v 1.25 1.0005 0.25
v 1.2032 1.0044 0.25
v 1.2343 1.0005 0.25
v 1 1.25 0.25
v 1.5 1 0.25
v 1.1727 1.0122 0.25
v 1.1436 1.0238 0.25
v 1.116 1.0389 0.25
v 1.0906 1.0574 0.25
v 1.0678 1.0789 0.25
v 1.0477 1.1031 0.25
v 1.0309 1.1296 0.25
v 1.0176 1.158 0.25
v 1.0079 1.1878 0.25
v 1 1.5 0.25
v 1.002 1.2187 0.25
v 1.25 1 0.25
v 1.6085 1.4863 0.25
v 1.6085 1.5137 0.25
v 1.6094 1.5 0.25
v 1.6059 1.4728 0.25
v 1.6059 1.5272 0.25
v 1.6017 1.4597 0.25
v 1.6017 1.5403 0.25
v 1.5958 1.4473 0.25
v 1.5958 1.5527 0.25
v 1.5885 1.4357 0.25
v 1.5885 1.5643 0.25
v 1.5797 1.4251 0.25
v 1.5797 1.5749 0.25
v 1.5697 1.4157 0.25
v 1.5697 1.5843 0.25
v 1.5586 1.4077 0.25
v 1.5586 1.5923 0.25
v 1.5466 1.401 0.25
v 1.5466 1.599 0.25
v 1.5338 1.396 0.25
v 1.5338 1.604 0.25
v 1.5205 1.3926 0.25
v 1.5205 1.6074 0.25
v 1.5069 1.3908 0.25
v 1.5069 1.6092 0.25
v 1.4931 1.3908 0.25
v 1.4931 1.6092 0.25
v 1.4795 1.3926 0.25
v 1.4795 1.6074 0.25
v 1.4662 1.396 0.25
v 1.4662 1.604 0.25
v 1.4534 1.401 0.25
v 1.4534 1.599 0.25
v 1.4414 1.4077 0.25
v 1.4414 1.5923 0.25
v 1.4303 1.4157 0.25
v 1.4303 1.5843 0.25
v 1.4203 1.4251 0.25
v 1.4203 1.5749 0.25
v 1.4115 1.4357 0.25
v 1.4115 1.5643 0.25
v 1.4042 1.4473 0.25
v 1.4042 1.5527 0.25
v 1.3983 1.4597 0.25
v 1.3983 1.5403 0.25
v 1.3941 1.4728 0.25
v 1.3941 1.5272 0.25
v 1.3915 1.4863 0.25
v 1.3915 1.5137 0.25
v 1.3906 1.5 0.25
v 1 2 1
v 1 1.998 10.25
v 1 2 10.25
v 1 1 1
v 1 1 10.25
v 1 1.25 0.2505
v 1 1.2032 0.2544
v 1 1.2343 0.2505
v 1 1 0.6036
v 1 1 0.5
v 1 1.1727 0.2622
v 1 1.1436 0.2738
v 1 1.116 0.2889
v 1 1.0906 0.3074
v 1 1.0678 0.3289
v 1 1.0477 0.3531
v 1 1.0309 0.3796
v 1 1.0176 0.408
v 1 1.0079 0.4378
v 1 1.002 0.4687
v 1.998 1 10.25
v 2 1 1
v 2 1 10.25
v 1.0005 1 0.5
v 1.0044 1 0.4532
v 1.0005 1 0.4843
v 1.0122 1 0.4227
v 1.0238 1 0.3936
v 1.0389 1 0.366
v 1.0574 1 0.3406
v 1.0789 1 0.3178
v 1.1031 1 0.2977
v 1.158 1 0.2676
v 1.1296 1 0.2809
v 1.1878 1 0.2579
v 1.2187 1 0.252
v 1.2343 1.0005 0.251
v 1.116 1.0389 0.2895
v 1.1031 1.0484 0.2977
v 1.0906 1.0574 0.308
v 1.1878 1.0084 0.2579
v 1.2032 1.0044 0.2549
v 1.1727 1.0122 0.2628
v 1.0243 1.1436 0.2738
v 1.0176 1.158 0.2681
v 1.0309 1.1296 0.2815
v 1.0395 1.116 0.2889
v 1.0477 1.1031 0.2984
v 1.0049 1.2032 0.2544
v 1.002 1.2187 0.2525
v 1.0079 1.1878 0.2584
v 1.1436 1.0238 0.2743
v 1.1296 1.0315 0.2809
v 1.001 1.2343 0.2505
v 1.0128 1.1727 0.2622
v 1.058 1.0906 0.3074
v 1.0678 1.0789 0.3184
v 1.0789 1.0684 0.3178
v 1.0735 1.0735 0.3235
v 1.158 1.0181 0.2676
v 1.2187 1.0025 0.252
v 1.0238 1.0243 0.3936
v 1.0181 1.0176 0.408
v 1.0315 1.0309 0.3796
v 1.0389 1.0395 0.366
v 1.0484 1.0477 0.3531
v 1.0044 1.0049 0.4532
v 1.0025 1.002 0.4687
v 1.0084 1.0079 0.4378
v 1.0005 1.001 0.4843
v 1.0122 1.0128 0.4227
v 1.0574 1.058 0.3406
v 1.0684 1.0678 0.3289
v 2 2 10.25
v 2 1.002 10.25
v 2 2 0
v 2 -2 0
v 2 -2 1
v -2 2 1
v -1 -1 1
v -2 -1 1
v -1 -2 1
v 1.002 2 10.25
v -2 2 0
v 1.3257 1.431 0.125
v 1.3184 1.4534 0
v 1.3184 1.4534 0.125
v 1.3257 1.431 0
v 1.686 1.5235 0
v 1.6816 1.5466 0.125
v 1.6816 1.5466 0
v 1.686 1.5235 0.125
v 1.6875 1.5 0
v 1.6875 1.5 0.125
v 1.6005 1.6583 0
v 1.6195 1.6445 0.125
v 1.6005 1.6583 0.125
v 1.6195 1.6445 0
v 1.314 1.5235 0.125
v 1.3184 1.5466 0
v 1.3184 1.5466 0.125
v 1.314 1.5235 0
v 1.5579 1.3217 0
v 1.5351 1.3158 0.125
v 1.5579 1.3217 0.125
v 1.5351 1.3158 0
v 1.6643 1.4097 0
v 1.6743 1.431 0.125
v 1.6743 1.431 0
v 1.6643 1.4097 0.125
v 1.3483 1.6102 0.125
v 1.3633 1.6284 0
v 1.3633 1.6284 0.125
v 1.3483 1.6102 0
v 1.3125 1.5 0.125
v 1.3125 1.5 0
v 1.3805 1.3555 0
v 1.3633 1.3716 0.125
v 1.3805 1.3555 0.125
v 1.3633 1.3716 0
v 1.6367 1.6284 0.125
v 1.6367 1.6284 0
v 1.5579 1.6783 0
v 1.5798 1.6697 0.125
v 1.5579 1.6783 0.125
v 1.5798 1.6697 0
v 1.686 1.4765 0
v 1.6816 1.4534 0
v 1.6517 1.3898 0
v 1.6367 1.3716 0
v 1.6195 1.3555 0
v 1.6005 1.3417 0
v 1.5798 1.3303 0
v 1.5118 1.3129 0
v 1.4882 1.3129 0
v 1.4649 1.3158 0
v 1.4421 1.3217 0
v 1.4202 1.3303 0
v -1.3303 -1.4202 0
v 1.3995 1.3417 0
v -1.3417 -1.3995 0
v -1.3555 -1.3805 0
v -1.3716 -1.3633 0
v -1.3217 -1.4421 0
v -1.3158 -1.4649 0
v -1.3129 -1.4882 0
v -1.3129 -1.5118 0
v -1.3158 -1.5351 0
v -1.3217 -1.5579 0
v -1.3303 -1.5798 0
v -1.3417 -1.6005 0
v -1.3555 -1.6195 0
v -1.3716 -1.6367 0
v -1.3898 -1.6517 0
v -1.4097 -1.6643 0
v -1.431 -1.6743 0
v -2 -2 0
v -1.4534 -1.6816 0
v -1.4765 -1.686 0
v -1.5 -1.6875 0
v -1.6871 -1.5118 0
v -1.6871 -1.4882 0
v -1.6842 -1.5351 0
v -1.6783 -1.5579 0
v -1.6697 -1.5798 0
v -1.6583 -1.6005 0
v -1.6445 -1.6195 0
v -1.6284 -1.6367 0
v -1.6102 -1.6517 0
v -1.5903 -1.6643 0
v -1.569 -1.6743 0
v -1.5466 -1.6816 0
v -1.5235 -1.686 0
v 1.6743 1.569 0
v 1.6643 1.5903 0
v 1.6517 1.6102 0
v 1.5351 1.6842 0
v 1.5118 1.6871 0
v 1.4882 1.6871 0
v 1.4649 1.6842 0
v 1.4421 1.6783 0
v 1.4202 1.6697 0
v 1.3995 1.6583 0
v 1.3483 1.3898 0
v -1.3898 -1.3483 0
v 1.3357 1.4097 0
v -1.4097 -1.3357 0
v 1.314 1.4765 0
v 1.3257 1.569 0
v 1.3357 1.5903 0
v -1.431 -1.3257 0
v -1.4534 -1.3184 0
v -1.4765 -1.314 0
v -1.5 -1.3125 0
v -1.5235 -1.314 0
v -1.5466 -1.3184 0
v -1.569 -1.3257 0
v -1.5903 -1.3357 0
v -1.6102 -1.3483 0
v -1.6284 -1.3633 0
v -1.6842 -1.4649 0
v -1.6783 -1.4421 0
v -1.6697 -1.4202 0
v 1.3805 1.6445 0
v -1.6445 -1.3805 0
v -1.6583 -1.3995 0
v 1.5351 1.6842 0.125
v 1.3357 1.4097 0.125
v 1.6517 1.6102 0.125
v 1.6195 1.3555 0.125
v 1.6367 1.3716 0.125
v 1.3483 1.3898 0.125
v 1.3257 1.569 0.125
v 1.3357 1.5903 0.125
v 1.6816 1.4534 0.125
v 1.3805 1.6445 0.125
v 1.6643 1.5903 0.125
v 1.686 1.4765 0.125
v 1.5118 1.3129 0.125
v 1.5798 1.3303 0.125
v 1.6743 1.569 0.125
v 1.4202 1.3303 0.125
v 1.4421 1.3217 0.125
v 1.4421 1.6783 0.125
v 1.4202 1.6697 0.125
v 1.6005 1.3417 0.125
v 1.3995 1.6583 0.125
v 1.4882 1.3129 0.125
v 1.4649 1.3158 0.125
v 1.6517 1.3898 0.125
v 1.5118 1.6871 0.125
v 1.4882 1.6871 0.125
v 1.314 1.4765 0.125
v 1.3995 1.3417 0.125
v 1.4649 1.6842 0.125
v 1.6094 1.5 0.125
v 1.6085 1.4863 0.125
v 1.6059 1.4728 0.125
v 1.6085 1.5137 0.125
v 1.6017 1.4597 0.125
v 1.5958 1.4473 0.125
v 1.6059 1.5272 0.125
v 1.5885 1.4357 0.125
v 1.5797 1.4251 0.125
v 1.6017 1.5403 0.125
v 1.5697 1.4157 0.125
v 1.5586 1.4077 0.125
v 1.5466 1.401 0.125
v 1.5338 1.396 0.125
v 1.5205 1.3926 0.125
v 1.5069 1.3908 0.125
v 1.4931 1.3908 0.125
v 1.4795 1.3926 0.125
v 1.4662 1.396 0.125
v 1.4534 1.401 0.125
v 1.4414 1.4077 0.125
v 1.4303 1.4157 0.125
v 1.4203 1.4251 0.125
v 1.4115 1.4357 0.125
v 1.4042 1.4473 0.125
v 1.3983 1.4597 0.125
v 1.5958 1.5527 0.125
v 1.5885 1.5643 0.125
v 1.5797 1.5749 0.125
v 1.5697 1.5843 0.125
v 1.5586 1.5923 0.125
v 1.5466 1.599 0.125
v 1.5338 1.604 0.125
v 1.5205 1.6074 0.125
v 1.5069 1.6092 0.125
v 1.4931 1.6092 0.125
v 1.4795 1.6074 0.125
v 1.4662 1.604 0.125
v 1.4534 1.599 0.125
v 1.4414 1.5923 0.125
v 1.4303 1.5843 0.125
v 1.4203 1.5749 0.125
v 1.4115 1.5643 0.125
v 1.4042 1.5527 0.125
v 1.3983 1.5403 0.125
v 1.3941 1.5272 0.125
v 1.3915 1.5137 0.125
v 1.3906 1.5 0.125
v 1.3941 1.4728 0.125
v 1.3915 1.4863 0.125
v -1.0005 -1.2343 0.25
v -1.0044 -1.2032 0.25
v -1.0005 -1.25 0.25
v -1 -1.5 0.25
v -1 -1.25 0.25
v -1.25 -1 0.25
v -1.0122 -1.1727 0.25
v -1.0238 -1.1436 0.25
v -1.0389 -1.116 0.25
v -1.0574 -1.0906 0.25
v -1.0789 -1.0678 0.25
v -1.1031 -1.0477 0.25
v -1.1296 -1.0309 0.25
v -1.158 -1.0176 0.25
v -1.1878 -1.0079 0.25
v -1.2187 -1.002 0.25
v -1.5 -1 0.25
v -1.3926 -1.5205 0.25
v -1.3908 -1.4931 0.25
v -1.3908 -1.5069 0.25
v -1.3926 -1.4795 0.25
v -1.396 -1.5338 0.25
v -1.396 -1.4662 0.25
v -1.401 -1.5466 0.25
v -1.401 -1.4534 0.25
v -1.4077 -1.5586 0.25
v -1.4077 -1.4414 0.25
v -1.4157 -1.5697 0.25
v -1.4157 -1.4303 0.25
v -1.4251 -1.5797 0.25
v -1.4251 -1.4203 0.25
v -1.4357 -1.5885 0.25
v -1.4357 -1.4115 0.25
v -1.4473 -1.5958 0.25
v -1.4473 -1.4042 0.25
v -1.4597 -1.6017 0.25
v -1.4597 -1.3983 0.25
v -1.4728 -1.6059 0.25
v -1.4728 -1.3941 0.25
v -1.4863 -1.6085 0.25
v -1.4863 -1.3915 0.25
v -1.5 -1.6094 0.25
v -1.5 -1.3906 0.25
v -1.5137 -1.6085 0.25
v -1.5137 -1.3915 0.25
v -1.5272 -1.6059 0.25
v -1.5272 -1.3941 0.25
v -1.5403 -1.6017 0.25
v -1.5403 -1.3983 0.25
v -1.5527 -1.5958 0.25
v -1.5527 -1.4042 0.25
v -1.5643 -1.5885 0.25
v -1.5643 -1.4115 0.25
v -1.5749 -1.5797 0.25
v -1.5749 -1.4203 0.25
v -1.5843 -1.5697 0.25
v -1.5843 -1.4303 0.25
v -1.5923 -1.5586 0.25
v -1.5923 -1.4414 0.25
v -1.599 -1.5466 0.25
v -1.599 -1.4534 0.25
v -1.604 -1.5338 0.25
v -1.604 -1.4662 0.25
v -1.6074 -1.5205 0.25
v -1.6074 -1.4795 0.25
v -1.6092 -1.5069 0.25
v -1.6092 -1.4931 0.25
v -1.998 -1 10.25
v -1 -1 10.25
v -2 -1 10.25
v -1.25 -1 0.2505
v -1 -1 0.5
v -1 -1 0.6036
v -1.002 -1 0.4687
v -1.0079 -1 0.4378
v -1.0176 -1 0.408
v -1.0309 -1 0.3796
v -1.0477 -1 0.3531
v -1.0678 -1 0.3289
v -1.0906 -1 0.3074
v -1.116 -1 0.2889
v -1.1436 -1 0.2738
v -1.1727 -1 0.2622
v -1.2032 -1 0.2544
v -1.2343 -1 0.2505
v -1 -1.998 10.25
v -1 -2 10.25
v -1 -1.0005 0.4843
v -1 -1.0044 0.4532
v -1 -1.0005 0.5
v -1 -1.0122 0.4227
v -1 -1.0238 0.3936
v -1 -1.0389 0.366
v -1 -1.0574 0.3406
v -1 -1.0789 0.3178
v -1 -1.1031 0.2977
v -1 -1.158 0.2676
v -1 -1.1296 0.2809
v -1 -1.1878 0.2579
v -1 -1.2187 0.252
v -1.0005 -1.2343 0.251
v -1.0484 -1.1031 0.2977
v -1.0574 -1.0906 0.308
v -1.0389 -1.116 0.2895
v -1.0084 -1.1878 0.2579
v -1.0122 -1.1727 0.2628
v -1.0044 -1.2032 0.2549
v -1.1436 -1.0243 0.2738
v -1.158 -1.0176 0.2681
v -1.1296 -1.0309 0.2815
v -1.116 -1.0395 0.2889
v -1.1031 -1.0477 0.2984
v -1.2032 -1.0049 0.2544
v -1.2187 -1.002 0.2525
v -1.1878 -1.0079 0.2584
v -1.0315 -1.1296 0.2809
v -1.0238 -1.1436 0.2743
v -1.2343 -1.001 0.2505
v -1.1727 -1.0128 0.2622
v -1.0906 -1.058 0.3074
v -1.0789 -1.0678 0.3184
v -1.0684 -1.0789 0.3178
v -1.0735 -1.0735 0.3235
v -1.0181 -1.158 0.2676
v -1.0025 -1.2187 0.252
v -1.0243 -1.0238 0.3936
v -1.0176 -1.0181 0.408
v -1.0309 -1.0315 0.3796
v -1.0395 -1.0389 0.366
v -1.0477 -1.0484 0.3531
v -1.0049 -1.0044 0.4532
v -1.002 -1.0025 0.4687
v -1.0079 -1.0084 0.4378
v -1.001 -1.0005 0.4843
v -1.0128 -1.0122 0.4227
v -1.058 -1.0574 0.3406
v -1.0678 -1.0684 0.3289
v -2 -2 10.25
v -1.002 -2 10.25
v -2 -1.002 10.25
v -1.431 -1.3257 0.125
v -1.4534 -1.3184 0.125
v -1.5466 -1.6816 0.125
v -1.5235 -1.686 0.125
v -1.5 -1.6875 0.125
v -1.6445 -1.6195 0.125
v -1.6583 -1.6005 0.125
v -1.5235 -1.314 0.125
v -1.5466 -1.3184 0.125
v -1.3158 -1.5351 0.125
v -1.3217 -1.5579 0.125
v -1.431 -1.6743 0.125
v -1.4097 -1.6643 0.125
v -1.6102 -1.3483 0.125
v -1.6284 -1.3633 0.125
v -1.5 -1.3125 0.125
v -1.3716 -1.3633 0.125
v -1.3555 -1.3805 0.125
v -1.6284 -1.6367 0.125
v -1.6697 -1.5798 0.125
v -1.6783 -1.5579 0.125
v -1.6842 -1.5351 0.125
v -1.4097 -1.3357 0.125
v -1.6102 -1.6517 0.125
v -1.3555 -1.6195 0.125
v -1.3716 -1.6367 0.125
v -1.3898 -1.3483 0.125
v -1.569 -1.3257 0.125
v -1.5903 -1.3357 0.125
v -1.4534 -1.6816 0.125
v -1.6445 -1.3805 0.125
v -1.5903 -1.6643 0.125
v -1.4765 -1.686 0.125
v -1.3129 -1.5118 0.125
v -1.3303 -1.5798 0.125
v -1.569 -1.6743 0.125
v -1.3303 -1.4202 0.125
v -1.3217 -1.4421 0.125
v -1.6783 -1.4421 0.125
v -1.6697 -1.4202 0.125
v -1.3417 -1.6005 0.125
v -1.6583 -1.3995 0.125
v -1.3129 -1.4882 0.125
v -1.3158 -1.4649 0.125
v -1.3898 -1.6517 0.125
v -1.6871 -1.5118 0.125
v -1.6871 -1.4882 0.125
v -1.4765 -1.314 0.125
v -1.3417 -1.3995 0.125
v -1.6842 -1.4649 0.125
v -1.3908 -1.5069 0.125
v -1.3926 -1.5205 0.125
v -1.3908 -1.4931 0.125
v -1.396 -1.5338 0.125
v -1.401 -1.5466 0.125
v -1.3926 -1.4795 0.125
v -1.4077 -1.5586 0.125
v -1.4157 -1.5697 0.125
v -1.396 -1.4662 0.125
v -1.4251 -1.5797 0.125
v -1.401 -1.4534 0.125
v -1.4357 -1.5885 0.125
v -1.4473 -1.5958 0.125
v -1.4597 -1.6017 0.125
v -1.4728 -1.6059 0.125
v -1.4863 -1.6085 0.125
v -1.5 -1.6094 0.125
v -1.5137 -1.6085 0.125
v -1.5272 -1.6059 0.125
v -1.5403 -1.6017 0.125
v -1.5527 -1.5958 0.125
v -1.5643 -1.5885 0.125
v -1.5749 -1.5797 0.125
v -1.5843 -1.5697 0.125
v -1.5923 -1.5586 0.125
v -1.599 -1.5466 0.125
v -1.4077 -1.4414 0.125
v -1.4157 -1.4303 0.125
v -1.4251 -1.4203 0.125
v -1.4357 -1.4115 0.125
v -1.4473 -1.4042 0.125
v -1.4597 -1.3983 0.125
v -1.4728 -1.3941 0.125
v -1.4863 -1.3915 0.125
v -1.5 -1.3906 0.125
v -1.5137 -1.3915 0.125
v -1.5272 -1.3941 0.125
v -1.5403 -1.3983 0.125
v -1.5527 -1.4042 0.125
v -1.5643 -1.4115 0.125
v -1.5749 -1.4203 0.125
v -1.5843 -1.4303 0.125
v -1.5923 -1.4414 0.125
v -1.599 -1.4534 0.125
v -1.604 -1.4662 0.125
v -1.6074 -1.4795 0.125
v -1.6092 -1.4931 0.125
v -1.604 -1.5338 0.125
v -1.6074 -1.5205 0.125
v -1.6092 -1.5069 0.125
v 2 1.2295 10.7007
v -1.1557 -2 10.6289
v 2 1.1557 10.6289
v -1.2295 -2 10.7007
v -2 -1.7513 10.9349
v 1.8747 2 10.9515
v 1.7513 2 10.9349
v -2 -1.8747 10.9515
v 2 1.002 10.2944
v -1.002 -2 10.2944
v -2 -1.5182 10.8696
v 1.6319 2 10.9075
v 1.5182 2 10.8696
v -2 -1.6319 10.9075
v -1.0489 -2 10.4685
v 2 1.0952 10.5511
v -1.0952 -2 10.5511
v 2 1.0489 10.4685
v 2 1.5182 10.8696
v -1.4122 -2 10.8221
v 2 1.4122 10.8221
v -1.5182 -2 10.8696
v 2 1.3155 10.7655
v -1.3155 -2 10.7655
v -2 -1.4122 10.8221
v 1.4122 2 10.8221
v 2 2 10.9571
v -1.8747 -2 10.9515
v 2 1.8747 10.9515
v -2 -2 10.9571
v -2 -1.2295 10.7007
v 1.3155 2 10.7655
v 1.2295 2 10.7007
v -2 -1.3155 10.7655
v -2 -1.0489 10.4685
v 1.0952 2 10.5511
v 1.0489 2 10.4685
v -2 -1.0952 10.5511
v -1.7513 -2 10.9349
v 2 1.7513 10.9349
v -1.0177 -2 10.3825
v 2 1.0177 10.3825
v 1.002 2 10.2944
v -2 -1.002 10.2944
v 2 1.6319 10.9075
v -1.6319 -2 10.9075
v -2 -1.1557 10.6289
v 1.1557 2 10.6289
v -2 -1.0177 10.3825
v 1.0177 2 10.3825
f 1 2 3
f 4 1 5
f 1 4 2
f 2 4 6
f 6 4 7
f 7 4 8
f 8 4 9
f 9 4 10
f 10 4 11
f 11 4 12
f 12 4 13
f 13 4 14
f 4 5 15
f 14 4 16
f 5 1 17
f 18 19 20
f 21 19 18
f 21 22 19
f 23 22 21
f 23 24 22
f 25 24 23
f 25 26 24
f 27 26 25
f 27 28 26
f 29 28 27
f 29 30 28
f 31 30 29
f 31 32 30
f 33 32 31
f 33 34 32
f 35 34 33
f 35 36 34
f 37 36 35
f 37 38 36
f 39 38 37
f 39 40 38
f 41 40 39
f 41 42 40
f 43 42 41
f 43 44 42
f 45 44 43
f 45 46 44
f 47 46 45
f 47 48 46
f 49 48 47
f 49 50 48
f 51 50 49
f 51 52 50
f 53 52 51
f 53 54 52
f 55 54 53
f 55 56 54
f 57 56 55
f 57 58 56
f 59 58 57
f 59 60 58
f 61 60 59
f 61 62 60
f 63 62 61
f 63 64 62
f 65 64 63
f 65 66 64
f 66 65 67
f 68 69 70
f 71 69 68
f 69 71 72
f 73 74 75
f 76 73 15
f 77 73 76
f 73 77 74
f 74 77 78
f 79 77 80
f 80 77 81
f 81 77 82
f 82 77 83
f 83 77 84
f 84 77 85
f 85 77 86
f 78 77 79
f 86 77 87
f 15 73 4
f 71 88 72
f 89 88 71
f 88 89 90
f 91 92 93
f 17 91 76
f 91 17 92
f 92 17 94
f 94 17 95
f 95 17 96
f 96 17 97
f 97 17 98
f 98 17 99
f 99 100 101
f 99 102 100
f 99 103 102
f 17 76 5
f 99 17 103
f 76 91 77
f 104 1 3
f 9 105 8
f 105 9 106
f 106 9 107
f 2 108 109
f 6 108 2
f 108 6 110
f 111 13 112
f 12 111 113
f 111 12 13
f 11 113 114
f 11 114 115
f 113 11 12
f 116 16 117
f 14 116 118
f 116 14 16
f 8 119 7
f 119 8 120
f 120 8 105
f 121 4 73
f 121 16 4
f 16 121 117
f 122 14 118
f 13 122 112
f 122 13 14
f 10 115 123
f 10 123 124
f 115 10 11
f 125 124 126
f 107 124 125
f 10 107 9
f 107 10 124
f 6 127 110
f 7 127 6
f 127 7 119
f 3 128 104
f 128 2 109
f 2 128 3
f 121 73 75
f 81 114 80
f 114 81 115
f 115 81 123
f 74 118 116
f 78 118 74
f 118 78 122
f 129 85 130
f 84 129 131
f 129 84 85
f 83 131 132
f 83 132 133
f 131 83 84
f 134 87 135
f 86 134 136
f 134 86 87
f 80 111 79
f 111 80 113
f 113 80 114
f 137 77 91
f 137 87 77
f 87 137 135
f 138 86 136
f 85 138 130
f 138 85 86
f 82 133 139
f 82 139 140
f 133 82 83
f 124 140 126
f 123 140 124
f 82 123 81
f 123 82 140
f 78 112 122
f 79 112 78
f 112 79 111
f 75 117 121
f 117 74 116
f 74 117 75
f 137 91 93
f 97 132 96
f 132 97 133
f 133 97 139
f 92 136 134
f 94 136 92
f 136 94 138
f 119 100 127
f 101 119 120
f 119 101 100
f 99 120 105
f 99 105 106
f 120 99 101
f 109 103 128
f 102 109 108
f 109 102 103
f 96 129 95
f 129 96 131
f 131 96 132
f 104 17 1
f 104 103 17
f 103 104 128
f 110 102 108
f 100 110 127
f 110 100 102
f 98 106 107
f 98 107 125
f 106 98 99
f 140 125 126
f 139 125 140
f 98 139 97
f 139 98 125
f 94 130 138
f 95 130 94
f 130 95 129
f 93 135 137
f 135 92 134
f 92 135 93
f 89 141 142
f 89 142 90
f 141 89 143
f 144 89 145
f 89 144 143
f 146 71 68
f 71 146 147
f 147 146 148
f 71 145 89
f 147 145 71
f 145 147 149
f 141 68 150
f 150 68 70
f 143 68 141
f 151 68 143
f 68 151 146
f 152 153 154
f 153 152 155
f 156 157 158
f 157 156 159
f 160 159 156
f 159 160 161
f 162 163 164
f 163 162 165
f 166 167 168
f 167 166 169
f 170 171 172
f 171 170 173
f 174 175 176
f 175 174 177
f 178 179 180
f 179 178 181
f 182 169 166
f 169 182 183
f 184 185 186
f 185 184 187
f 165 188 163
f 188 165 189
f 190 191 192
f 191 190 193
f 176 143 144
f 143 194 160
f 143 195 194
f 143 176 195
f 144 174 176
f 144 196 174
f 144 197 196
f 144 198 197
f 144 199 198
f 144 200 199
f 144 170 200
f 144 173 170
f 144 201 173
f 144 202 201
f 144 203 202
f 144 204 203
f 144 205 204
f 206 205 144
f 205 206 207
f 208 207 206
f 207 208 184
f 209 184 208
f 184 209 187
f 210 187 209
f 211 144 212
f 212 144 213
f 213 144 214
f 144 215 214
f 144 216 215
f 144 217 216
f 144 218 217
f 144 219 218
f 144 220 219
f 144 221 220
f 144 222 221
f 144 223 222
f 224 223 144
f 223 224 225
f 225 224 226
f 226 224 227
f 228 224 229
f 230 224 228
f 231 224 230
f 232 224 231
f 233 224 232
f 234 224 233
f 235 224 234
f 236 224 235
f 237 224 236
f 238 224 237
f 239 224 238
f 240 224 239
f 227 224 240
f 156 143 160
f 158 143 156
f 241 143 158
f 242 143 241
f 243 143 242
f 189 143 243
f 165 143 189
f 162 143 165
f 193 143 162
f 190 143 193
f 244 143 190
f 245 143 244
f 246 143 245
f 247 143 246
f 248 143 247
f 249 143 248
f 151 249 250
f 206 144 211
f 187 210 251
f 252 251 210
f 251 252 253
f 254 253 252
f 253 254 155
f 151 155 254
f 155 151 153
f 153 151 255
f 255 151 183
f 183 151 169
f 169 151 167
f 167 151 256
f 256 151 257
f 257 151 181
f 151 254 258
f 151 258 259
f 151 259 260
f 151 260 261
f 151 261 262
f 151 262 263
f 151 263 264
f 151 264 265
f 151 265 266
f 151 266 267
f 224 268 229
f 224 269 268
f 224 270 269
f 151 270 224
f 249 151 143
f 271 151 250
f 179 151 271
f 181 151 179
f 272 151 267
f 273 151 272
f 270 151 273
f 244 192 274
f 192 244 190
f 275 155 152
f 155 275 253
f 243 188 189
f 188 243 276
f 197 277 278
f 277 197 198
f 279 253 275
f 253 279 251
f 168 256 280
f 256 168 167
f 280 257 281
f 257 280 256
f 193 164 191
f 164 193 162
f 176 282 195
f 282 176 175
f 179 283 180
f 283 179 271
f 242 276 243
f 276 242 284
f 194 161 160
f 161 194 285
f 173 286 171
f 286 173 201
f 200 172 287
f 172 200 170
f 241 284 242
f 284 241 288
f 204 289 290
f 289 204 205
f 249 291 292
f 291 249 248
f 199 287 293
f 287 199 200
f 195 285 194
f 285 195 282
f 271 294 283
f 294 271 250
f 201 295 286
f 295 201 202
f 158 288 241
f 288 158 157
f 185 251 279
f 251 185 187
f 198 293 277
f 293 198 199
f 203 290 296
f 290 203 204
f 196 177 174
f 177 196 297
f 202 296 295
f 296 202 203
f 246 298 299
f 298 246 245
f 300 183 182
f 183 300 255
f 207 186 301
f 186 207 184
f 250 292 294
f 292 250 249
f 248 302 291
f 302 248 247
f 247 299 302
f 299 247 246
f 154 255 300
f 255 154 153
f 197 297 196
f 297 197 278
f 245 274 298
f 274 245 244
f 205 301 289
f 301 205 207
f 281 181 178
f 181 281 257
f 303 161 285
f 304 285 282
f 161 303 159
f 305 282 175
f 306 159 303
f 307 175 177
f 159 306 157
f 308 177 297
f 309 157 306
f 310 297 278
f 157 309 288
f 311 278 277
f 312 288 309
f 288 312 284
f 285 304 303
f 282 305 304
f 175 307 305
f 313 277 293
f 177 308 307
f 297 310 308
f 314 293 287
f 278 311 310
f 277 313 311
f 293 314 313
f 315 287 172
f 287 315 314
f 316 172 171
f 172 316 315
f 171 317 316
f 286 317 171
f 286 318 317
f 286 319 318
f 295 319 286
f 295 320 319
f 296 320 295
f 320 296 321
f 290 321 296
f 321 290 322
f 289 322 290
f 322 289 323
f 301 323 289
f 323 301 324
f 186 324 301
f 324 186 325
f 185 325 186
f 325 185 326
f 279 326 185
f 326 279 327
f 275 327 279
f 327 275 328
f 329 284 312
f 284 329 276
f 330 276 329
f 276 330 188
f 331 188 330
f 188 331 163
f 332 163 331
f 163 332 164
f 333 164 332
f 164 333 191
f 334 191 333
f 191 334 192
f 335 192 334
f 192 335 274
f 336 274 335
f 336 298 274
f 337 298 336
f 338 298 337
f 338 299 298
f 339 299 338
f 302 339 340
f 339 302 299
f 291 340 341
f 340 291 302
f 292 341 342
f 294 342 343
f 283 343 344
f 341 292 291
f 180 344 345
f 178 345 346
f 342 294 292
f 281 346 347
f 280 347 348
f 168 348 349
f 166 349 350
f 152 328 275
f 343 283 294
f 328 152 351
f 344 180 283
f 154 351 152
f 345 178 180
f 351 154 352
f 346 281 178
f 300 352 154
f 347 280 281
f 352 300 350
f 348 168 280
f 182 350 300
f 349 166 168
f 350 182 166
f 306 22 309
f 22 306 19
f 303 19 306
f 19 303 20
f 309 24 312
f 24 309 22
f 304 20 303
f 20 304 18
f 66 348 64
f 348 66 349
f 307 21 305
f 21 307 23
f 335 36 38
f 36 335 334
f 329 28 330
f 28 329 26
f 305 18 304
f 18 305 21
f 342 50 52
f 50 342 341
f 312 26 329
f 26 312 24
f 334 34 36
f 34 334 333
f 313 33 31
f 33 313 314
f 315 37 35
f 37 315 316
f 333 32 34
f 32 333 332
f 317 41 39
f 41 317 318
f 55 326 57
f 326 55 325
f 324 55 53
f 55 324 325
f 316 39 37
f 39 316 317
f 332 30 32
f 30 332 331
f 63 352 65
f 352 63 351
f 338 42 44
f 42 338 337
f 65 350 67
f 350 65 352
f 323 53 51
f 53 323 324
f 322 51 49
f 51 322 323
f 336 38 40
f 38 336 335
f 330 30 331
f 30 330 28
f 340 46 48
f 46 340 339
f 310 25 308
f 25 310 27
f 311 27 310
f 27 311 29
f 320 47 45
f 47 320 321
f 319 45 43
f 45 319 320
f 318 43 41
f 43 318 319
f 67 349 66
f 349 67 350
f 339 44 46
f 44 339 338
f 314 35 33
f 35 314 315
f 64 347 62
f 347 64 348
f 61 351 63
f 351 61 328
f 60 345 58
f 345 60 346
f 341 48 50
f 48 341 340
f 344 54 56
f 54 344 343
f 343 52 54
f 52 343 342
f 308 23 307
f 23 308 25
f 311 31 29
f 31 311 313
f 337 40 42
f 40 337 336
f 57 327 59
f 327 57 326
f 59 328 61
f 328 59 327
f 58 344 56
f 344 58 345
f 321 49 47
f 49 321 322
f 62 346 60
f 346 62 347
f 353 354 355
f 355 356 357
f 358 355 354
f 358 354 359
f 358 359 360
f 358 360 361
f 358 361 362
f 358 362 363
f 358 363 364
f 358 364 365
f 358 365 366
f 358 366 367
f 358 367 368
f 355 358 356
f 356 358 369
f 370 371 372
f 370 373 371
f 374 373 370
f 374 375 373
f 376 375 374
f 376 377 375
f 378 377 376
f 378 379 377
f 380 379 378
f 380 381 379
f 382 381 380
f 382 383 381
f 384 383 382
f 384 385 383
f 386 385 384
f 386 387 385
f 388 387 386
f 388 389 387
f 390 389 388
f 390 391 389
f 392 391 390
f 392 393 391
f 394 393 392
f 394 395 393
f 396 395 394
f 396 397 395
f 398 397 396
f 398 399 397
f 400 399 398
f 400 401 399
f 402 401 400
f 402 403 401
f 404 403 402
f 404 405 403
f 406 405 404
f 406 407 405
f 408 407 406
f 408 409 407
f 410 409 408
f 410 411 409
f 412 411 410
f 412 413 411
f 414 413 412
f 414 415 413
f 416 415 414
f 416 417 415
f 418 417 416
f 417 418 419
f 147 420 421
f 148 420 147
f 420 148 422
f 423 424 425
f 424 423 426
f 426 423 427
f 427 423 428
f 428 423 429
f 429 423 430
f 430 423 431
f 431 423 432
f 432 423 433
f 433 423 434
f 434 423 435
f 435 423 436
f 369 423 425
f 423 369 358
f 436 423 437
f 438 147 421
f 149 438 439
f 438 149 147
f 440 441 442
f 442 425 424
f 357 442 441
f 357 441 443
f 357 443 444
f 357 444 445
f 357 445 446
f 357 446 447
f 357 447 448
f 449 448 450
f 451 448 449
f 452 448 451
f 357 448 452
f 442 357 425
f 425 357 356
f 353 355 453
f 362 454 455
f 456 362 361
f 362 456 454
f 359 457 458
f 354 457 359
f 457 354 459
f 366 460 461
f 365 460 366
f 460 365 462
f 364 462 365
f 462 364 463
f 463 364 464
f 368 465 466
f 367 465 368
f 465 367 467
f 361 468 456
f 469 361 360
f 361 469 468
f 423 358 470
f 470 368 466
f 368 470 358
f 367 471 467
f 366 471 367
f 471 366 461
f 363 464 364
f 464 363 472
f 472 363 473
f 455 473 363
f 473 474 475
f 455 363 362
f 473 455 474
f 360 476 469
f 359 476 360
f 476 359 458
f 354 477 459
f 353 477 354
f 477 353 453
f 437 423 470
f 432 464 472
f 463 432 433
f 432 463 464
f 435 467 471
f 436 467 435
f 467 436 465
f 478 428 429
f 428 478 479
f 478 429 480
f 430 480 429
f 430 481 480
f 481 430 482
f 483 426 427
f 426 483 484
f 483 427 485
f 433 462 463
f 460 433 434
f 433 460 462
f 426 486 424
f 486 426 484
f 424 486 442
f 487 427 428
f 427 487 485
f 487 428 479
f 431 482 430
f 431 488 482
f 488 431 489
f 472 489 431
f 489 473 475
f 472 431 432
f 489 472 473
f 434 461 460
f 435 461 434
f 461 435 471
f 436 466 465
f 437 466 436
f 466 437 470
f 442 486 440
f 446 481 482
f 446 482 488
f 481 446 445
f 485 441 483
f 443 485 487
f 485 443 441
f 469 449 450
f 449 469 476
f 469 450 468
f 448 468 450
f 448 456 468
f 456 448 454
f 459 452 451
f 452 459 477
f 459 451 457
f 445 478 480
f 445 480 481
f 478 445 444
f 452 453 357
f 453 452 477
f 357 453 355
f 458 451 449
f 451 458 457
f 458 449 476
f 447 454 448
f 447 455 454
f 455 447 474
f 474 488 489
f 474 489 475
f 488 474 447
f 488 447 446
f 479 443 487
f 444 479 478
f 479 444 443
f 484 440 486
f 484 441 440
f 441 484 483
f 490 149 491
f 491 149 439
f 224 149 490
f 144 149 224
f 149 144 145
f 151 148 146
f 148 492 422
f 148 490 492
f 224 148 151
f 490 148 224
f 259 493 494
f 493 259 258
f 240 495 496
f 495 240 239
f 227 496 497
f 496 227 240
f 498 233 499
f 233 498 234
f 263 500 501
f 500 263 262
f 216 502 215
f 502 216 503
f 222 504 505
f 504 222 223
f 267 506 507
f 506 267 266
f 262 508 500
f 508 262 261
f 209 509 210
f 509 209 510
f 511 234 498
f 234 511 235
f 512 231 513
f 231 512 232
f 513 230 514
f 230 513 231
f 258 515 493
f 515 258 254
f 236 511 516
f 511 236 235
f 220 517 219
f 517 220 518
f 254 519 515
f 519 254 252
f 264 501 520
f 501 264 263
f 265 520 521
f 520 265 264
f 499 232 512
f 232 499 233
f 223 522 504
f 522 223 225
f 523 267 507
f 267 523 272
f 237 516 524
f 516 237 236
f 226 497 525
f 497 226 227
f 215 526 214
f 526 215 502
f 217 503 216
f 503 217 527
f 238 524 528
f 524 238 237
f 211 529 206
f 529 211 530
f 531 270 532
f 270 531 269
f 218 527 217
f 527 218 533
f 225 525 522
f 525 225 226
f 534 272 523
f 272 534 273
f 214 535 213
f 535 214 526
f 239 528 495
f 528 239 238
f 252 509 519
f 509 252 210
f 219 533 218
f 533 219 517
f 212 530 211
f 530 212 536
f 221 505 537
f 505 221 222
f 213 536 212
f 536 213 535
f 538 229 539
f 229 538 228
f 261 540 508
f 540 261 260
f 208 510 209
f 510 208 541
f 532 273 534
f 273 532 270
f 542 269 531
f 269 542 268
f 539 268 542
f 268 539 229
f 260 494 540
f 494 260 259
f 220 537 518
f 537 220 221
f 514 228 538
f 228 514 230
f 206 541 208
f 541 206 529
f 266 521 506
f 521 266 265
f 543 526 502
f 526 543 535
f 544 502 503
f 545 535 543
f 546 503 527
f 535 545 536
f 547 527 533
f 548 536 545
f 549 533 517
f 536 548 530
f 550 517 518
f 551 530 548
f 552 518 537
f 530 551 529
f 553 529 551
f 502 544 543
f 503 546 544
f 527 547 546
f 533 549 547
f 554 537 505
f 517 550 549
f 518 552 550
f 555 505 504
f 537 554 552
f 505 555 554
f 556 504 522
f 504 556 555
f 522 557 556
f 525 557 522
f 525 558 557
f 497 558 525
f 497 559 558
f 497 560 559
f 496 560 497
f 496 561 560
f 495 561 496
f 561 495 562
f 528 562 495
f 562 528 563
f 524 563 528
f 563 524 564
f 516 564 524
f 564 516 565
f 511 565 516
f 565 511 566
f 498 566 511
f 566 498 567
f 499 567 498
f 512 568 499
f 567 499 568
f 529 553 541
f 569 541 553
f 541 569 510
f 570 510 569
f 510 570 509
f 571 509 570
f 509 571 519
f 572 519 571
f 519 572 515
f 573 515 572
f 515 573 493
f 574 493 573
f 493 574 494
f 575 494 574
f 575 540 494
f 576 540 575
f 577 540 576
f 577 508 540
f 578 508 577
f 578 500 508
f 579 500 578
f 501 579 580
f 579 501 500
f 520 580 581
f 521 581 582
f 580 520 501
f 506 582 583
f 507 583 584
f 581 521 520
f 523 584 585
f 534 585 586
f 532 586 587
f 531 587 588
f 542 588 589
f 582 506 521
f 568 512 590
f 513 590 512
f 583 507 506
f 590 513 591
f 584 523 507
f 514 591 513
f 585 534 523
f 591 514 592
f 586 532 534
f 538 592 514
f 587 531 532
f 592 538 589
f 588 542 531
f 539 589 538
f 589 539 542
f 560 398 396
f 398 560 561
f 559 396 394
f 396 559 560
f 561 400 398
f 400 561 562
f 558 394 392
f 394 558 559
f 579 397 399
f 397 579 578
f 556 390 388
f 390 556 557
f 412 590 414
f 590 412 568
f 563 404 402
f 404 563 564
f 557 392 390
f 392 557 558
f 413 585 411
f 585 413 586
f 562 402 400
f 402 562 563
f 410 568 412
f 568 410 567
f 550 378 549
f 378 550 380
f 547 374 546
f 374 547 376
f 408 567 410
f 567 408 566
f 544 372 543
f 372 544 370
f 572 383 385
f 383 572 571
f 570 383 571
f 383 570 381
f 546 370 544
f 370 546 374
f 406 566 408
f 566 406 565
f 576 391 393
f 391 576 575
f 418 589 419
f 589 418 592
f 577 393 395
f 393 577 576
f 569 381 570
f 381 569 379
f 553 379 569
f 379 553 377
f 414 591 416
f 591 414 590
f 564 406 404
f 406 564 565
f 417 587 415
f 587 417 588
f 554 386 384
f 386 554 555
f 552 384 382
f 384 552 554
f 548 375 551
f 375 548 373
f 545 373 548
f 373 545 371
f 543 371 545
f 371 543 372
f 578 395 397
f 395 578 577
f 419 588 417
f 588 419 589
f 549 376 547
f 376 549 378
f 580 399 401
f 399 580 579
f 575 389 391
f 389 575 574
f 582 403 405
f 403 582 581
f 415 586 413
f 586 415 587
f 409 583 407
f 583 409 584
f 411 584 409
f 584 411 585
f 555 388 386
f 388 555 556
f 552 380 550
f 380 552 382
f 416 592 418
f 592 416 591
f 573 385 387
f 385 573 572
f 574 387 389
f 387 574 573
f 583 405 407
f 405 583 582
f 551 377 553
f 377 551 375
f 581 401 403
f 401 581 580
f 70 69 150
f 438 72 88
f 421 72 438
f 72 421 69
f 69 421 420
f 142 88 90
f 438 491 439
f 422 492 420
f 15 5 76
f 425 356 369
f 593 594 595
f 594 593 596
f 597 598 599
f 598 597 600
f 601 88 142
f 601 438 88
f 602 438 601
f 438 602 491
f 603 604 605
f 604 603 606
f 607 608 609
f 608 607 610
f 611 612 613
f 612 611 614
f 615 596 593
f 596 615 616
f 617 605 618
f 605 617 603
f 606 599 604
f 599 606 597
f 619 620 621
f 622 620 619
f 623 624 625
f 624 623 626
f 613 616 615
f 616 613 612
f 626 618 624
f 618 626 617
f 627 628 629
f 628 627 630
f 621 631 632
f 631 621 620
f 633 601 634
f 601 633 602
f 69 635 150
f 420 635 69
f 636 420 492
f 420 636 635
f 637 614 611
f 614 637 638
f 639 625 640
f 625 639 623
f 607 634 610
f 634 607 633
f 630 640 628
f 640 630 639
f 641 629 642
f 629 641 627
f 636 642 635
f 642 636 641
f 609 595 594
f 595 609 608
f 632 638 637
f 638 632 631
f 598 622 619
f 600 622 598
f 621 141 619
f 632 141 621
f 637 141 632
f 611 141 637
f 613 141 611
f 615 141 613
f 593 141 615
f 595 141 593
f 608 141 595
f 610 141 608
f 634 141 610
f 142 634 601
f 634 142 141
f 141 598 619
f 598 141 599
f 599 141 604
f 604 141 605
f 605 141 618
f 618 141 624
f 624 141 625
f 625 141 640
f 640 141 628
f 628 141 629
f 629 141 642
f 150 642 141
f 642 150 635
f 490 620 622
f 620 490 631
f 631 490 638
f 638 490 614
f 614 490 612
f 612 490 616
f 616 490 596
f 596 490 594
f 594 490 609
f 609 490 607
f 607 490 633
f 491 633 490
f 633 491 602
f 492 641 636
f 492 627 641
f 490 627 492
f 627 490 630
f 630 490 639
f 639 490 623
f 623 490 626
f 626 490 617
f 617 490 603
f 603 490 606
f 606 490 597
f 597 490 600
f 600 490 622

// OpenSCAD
$fn = 50;
stand();

module stand() {
    width = 4;
    length = 4;
    height = 1;

    post_width = 1;
    post_scale = 5/16;

    difference() {
        base_block(width, length, height);
        post_holes(width, length, height, post_width, post_scale);
    }

    // We need to get the lift (1/4) out of post_holes properly.
    frame(width, length, 1/4, post_width, post_scale);
}

module base_block(width, length, height) {
    translate([0, 0, height/2]) {
        cube([width, length, height], center=true);
    }
}

module post_holes(width, length, height, post_width) {
    module milled_hole(height, screw_stack) {
        milled_height = height - screw_stack;

        module tool_extreme(tool_diameter) {
            tool_radius = tool_diameter/2;

            difference() {
                cube([tool_radius, tool_radius, milled_height]);
                translate([tool_radius, tool_radius, 0]) {
                    cylinder(r = tool_radius, h = milled_height);
                }
            }
        }

        module x_y_z_extreme(tool_diameter) {
            intersection_for(i = [0, 1, 2]) {
                rotate(a = i*120, v = [1, 1, 1]) {
                    tool_extreme(tool_diameter);
                }
            }
        }

        difference() {
            cube([post_width, post_width, milled_height]);
            x_y_z_extreme(1/2);
        }
    }

    module hole() {
        // screw_head_height = 3/32;
        screw_head_height = 1/8;
        // screw_head_diameter = 0.312;
        screw_head_diameter = 0.375; // No washer..

        cylinder(h=screw_head_height, r=screw_head_diameter/2);

        // screw_dia = 0.19;
        screw_hole_dia = 7/32; // Or 1/4?
        screw_hole_height = 1/8;

        translate([0, 0, screw_head_height]) {
            cylinder(h=screw_hole_height, r=screw_hole_dia/2);
        }

        screw_stack = screw_head_height + screw_hole_height;
        post_height = height - screw_stack;

        translate([-post_width/2, -post_width/2, screw_stack]) {
            milled_hole(height, screw_stack);
        }
    }

    for(i = [0, 1]) {
        mirror([i, i, 0]) {
            translate([width/2 - post_width/2, length/2 - post_width/2, 0]) {
            // translate([width/2 - post_width/2, length/2 - post_width/2, 0]) {
                hole();
            }
        }
    }
}

module frame(width, length, lift, post_width) {
    post_height = 10;
    rise = (post_height + lift) - post_width/2;

    module pins() {
        module pin() {
            pin_diameter = 1/4;
            pin_length = post_width;

            translate([-width/2 + post_width/4, -length/2 + post_width/4, 0]) {
                rotate([0, 45, 45]) {
                    cylinder(h = pin_length, d = pin_diameter);
                }
            }
        }

        for (i = [0, 1]) {
            mirror([i, i, 0]) {
                # pin();
            }
        }
    }

    module verticals() {
        module mill_clearance(mill_diameter) {
            mill_radius = 1/2;

            rotate([-45, 0, -45]) {
                // Using a z-height of mill-diameter and centered lops off
                // mill_radius
                cube(
                      [mill_diameter*2, mill_diameter*2, mill_diameter]
                    , center = true
                );
            }
        }

        module vertical() {
            difference() {
                translate([width/2 - post_width, length/2 - post_width, lift]) {
                    difference() {
                        cube([post_width, post_width, post_height]);
                        mill_clearance(1/2);
                    }
                }
                translate([0, 0, rise]) {
                    pins();
                }
            }
        }

        for (i = [0, 1]) {
            rotate([0, 0, i*180]) {
                vertical();
            }
        }
    }

    module horizontal() {
        post_corners = sqrt(pow(width/2, 2) + pow(length/2, 2))*2;

        module bar() {
            bar_width = post_width*sqrt(2)/2;

            translate([0, 0, post_width/2]) {
                rotate([0, 90, 45]) {
                    difference() {
                        cylinder(h = post_corners, r = bar_width, center=true);
                        translate([bar_width, 0, 0]) {
                            cube([bar_width*2, bar_width*2, post_corners], center=true);
                        }
                    }
                }
            }
        }

        module chamfer() {
            translate([width/2, width/2, 0]) {
                rotate([90, 0, 0]) {
                    translate([0, -post_width/4, 0]) {
                        cube([post_width*1.5, post_width*2, post_width]);
                    }
                }
            }
        }

        module chamfers() {
            module chamfer_end() {
                chamfer();

                mirror([-1, 1, 0]) {
                    chamfer();
                }
            }

            chamfer_end();

            mirror([1, 1, 0]) {
                chamfer_end();
            }
        }

        difference() {
            bar();
            chamfers();
            pins();
        }
    }

    verticals();

    translate([0, 0, rise]) {
        horizontal();
        pins();
    }
}
